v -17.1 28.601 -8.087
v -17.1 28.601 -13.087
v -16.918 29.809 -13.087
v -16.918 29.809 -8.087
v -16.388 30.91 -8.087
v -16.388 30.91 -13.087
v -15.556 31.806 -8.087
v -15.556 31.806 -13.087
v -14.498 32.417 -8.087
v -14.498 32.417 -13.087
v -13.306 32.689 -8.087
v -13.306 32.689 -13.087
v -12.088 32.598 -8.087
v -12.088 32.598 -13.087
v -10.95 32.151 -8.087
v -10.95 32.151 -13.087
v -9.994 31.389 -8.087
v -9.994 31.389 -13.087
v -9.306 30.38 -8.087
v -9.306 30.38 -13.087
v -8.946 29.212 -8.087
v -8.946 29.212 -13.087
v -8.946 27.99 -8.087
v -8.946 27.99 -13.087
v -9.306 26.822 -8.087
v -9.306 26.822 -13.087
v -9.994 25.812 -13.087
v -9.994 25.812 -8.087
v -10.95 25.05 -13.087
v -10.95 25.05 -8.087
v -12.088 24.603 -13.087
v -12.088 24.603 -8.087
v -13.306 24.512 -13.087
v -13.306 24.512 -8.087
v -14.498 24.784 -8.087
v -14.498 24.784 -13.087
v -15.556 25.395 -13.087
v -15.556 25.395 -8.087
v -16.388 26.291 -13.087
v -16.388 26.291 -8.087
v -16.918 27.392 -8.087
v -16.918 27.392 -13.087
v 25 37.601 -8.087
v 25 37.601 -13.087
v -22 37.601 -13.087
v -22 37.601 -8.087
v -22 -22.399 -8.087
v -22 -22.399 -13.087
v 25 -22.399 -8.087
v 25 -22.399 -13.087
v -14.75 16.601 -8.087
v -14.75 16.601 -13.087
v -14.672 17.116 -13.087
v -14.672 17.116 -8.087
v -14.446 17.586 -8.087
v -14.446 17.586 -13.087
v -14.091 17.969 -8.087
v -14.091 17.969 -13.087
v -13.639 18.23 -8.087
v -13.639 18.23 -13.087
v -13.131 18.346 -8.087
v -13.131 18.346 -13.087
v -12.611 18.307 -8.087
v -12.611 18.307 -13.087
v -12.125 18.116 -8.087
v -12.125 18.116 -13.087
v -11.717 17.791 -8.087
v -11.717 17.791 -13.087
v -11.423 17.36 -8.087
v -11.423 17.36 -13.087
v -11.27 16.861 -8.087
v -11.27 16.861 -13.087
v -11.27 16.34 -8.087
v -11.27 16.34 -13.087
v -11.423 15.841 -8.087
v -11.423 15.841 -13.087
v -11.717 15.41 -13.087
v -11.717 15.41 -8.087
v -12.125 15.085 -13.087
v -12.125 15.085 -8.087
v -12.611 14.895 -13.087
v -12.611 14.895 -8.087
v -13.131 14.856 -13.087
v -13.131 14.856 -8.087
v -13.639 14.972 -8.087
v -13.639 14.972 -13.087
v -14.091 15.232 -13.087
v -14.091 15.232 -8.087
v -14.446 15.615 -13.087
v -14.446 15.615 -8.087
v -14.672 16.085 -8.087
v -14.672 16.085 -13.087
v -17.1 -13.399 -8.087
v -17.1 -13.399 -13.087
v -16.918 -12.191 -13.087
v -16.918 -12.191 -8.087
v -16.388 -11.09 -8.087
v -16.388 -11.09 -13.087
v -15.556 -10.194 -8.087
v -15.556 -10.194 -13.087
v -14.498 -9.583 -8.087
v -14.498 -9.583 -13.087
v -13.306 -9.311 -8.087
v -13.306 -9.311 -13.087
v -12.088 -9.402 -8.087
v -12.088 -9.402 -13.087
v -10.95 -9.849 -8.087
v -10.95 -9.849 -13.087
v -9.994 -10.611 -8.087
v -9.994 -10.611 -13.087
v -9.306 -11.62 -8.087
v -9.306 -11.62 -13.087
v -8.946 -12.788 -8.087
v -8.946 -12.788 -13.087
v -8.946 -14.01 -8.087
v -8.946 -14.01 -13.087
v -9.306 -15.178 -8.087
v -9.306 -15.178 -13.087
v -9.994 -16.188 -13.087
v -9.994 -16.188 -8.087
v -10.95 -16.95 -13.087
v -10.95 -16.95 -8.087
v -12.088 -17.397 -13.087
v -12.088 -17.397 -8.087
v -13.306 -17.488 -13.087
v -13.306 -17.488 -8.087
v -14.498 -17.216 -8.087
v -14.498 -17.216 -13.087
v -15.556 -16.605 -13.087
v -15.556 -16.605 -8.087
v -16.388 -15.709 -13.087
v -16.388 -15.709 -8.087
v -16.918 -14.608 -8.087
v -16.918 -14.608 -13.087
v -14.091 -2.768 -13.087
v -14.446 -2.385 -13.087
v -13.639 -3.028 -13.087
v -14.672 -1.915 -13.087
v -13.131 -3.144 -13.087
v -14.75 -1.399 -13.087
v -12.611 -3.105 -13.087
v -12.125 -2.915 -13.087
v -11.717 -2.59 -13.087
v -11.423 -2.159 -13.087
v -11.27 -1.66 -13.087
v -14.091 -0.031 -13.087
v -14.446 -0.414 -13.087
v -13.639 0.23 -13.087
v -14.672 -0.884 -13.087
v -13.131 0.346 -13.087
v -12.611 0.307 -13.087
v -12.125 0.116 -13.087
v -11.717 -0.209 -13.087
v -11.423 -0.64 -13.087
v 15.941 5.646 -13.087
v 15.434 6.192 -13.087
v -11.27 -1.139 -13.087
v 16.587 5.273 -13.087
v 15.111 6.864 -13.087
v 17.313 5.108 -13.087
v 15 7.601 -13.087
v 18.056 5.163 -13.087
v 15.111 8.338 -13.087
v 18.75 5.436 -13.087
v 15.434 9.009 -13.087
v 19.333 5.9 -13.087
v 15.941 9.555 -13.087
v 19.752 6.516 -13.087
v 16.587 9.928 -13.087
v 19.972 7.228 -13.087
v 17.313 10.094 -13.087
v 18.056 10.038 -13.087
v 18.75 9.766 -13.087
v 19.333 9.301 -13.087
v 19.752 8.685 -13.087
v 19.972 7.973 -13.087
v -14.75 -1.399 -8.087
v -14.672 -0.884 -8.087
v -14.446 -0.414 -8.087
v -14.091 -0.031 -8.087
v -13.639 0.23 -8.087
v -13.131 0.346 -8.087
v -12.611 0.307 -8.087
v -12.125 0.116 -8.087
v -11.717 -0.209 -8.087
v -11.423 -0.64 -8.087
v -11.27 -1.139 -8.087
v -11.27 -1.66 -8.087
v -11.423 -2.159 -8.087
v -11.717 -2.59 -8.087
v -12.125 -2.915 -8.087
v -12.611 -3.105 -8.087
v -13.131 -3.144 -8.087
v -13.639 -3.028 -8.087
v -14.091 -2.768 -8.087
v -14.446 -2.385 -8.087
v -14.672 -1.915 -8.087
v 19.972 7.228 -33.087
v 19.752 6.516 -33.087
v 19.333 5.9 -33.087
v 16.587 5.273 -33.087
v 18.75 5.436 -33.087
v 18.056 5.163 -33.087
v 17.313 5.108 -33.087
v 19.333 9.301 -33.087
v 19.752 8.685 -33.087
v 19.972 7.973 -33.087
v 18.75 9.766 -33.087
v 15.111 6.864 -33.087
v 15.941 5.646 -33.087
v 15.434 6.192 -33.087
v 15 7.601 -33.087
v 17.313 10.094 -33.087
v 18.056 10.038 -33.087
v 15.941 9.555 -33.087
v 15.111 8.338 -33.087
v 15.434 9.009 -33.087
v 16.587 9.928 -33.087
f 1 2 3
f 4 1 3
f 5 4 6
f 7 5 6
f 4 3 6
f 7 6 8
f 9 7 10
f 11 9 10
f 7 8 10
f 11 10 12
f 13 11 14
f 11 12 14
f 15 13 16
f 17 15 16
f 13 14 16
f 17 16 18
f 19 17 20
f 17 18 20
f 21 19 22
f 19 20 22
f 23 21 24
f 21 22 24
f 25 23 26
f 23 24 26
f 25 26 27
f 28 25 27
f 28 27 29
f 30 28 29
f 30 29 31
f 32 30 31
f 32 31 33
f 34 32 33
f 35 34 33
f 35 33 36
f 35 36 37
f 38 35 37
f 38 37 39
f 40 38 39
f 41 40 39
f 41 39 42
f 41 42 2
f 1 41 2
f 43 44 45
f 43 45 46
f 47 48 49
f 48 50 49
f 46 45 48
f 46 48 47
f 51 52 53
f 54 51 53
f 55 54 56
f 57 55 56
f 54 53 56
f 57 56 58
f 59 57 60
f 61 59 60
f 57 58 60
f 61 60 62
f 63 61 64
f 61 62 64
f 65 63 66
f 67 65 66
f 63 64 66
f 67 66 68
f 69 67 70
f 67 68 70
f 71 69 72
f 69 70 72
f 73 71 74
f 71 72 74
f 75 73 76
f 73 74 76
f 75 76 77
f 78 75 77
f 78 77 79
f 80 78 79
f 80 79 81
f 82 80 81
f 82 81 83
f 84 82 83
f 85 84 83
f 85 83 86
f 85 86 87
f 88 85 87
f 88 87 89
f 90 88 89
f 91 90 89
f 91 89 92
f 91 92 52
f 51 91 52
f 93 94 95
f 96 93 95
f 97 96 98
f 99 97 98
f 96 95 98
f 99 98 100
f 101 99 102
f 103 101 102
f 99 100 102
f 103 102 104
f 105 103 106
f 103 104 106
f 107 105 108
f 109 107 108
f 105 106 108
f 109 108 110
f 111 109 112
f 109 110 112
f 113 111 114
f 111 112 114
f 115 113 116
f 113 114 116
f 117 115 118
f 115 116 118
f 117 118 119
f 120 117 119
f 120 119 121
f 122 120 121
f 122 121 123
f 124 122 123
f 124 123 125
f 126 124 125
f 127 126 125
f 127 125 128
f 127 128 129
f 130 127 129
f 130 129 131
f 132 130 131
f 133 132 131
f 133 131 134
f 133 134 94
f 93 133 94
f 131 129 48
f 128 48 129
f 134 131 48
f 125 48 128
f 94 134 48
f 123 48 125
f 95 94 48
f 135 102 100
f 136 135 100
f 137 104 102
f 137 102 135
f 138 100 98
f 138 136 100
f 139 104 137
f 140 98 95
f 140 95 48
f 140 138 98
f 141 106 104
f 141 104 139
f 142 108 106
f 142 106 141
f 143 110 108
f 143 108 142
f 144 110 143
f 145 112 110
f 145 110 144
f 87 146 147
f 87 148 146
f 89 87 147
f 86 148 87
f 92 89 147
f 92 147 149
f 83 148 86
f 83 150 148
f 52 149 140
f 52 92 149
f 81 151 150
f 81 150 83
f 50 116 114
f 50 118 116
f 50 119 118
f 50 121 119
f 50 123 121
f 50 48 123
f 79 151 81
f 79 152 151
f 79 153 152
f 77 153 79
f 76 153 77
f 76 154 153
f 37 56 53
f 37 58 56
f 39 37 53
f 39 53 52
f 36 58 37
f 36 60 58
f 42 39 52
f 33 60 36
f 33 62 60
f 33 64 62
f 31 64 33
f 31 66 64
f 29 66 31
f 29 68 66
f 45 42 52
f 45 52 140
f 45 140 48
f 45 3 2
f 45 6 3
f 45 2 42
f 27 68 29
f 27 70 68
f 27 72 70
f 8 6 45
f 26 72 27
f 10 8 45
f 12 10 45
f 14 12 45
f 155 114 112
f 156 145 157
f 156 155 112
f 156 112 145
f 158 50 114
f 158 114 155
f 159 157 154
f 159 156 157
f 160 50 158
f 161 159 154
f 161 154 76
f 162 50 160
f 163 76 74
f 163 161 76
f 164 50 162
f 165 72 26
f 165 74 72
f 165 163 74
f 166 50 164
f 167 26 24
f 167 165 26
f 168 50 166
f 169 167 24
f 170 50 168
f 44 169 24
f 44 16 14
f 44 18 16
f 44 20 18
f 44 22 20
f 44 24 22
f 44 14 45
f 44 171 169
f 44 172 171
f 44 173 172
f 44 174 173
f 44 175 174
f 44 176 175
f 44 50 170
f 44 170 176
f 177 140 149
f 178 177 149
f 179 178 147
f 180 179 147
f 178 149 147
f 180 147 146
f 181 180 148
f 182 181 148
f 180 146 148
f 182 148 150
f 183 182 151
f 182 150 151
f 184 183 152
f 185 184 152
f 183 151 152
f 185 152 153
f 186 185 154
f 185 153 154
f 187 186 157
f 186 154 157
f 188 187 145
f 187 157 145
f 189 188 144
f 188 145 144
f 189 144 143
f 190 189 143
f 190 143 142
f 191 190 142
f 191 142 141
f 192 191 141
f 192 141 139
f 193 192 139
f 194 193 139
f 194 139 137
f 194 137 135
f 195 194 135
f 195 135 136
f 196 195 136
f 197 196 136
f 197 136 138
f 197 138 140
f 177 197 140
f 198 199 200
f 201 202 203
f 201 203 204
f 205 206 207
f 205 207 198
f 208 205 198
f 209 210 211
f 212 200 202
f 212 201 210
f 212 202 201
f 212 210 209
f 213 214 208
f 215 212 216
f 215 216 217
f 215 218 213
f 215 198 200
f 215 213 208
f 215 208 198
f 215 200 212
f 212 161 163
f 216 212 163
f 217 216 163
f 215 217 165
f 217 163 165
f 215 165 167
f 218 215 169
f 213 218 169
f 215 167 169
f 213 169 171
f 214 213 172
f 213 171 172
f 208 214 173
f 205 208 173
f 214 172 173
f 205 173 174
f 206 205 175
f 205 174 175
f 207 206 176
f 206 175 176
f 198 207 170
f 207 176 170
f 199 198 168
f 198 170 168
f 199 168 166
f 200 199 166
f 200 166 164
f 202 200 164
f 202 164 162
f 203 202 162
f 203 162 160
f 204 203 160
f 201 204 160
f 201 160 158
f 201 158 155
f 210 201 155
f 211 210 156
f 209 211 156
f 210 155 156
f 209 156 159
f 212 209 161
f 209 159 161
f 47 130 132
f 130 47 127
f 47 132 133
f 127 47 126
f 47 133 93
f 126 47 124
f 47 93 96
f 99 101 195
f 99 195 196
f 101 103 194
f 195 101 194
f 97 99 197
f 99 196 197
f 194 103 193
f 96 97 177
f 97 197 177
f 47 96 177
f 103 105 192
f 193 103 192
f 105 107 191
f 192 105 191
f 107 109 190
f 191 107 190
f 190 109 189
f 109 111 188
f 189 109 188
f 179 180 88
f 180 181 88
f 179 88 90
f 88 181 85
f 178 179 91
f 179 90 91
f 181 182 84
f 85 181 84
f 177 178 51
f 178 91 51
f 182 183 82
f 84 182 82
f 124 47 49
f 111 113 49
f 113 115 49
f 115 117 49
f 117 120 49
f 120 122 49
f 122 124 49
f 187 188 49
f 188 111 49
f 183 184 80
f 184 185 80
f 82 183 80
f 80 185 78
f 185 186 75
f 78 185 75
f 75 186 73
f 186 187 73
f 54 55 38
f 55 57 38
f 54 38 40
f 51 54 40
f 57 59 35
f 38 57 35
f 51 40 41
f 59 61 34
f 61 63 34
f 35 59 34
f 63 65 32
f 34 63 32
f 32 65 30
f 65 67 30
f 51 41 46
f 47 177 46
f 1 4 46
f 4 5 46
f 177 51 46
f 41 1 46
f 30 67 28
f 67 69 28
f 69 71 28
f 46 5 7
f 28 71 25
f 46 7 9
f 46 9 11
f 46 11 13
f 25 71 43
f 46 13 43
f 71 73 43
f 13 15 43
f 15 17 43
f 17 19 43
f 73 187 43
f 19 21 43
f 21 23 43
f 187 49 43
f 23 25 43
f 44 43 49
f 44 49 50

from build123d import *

# Parameters (mm, degrees)
SKETCH1_W           = 5
SKETCH1_H           = 60
BOSS_EXTRUDE1_DEPTH = 5
SKETCH2_W           = 5
SKETCH2_H           = 60
BOSS_EXTRUDE2_DEPTH = 20
SKETCH3_R           = 2.5
BOSS_EXTRUDE3_DEPTH = 20
SKETCH4_W           = 5
SKETCH4_H           = 60
BOSS_EXTRUDE4_DEPTH = 22
SKETCH5_R           = 4.1
SKETCH5_R_2         = 1.75
CUT_EXTRUDE1_DEPTH  = 6


with BuildPart() as part:
    # Sketch1 → Boss-Extrude1 (new body)
    with BuildSketch(Plane(origin=(0, 0, 0), x_dir=(0, 0, -1), z_dir=(1, 0, 0))):
        with Locations((10.587248322, 7.600671141)):
            Rectangle(SKETCH1_W, SKETCH1_H)
    extrude(amount=BOSS_EXTRUDE1_DEPTH)

    # Sketch2 → Boss-Extrude2 (add)
    with BuildSketch(Plane(origin=(5, 0, 0), x_dir=(0, 0, -1), z_dir=(1, 0, 0))):
        with Locations((10.587248322, 7.600671141)):
            Rectangle(SKETCH2_W, SKETCH2_H)
    extrude(amount=BOSS_EXTRUDE2_DEPTH)

    # Sketch3 → Boss-Extrude3 (add)
    with BuildSketch(Plane(origin=(0, 0, -13.087248322), x_dir=(-1, 0, 0), z_dir=(0, 0, -1))):
        with Locations((-17.5, 7.600671141)):
            Circle(SKETCH3_R)
    extrude(amount=BOSS_EXTRUDE3_DEPTH)

    # Sketch4 → Boss-Extrude4 (add)
    with BuildSketch(Plane.ZY):
        with Locations((-10.587248322, 7.600671141)):
            Rectangle(SKETCH4_W, SKETCH4_H)
    extrude(amount=BOSS_EXTRUDE4_DEPTH)

    # Sketch5 → Cut-Extrude1 (cut, through all)
    with BuildSketch(Plane(origin=(0, 0, -13.087248322), x_dir=(-1, 0, 0), z_dir=(0, 0, -1))):
        with Locations((13, 28.600671141)):
            Circle(SKETCH5_R)
        with Locations((13, -13.399328859)):
            Circle(SKETCH5_R)
        with Locations((13, -1.399328859)):
            Circle(SKETCH5_R_2)
        with Locations((13, 16.600671141)):
            Circle(SKETCH5_R_2)
    extrude(amount=-CUT_EXTRUDE1_DEPTH, mode=Mode.SUBTRACT)


solid = part.part
